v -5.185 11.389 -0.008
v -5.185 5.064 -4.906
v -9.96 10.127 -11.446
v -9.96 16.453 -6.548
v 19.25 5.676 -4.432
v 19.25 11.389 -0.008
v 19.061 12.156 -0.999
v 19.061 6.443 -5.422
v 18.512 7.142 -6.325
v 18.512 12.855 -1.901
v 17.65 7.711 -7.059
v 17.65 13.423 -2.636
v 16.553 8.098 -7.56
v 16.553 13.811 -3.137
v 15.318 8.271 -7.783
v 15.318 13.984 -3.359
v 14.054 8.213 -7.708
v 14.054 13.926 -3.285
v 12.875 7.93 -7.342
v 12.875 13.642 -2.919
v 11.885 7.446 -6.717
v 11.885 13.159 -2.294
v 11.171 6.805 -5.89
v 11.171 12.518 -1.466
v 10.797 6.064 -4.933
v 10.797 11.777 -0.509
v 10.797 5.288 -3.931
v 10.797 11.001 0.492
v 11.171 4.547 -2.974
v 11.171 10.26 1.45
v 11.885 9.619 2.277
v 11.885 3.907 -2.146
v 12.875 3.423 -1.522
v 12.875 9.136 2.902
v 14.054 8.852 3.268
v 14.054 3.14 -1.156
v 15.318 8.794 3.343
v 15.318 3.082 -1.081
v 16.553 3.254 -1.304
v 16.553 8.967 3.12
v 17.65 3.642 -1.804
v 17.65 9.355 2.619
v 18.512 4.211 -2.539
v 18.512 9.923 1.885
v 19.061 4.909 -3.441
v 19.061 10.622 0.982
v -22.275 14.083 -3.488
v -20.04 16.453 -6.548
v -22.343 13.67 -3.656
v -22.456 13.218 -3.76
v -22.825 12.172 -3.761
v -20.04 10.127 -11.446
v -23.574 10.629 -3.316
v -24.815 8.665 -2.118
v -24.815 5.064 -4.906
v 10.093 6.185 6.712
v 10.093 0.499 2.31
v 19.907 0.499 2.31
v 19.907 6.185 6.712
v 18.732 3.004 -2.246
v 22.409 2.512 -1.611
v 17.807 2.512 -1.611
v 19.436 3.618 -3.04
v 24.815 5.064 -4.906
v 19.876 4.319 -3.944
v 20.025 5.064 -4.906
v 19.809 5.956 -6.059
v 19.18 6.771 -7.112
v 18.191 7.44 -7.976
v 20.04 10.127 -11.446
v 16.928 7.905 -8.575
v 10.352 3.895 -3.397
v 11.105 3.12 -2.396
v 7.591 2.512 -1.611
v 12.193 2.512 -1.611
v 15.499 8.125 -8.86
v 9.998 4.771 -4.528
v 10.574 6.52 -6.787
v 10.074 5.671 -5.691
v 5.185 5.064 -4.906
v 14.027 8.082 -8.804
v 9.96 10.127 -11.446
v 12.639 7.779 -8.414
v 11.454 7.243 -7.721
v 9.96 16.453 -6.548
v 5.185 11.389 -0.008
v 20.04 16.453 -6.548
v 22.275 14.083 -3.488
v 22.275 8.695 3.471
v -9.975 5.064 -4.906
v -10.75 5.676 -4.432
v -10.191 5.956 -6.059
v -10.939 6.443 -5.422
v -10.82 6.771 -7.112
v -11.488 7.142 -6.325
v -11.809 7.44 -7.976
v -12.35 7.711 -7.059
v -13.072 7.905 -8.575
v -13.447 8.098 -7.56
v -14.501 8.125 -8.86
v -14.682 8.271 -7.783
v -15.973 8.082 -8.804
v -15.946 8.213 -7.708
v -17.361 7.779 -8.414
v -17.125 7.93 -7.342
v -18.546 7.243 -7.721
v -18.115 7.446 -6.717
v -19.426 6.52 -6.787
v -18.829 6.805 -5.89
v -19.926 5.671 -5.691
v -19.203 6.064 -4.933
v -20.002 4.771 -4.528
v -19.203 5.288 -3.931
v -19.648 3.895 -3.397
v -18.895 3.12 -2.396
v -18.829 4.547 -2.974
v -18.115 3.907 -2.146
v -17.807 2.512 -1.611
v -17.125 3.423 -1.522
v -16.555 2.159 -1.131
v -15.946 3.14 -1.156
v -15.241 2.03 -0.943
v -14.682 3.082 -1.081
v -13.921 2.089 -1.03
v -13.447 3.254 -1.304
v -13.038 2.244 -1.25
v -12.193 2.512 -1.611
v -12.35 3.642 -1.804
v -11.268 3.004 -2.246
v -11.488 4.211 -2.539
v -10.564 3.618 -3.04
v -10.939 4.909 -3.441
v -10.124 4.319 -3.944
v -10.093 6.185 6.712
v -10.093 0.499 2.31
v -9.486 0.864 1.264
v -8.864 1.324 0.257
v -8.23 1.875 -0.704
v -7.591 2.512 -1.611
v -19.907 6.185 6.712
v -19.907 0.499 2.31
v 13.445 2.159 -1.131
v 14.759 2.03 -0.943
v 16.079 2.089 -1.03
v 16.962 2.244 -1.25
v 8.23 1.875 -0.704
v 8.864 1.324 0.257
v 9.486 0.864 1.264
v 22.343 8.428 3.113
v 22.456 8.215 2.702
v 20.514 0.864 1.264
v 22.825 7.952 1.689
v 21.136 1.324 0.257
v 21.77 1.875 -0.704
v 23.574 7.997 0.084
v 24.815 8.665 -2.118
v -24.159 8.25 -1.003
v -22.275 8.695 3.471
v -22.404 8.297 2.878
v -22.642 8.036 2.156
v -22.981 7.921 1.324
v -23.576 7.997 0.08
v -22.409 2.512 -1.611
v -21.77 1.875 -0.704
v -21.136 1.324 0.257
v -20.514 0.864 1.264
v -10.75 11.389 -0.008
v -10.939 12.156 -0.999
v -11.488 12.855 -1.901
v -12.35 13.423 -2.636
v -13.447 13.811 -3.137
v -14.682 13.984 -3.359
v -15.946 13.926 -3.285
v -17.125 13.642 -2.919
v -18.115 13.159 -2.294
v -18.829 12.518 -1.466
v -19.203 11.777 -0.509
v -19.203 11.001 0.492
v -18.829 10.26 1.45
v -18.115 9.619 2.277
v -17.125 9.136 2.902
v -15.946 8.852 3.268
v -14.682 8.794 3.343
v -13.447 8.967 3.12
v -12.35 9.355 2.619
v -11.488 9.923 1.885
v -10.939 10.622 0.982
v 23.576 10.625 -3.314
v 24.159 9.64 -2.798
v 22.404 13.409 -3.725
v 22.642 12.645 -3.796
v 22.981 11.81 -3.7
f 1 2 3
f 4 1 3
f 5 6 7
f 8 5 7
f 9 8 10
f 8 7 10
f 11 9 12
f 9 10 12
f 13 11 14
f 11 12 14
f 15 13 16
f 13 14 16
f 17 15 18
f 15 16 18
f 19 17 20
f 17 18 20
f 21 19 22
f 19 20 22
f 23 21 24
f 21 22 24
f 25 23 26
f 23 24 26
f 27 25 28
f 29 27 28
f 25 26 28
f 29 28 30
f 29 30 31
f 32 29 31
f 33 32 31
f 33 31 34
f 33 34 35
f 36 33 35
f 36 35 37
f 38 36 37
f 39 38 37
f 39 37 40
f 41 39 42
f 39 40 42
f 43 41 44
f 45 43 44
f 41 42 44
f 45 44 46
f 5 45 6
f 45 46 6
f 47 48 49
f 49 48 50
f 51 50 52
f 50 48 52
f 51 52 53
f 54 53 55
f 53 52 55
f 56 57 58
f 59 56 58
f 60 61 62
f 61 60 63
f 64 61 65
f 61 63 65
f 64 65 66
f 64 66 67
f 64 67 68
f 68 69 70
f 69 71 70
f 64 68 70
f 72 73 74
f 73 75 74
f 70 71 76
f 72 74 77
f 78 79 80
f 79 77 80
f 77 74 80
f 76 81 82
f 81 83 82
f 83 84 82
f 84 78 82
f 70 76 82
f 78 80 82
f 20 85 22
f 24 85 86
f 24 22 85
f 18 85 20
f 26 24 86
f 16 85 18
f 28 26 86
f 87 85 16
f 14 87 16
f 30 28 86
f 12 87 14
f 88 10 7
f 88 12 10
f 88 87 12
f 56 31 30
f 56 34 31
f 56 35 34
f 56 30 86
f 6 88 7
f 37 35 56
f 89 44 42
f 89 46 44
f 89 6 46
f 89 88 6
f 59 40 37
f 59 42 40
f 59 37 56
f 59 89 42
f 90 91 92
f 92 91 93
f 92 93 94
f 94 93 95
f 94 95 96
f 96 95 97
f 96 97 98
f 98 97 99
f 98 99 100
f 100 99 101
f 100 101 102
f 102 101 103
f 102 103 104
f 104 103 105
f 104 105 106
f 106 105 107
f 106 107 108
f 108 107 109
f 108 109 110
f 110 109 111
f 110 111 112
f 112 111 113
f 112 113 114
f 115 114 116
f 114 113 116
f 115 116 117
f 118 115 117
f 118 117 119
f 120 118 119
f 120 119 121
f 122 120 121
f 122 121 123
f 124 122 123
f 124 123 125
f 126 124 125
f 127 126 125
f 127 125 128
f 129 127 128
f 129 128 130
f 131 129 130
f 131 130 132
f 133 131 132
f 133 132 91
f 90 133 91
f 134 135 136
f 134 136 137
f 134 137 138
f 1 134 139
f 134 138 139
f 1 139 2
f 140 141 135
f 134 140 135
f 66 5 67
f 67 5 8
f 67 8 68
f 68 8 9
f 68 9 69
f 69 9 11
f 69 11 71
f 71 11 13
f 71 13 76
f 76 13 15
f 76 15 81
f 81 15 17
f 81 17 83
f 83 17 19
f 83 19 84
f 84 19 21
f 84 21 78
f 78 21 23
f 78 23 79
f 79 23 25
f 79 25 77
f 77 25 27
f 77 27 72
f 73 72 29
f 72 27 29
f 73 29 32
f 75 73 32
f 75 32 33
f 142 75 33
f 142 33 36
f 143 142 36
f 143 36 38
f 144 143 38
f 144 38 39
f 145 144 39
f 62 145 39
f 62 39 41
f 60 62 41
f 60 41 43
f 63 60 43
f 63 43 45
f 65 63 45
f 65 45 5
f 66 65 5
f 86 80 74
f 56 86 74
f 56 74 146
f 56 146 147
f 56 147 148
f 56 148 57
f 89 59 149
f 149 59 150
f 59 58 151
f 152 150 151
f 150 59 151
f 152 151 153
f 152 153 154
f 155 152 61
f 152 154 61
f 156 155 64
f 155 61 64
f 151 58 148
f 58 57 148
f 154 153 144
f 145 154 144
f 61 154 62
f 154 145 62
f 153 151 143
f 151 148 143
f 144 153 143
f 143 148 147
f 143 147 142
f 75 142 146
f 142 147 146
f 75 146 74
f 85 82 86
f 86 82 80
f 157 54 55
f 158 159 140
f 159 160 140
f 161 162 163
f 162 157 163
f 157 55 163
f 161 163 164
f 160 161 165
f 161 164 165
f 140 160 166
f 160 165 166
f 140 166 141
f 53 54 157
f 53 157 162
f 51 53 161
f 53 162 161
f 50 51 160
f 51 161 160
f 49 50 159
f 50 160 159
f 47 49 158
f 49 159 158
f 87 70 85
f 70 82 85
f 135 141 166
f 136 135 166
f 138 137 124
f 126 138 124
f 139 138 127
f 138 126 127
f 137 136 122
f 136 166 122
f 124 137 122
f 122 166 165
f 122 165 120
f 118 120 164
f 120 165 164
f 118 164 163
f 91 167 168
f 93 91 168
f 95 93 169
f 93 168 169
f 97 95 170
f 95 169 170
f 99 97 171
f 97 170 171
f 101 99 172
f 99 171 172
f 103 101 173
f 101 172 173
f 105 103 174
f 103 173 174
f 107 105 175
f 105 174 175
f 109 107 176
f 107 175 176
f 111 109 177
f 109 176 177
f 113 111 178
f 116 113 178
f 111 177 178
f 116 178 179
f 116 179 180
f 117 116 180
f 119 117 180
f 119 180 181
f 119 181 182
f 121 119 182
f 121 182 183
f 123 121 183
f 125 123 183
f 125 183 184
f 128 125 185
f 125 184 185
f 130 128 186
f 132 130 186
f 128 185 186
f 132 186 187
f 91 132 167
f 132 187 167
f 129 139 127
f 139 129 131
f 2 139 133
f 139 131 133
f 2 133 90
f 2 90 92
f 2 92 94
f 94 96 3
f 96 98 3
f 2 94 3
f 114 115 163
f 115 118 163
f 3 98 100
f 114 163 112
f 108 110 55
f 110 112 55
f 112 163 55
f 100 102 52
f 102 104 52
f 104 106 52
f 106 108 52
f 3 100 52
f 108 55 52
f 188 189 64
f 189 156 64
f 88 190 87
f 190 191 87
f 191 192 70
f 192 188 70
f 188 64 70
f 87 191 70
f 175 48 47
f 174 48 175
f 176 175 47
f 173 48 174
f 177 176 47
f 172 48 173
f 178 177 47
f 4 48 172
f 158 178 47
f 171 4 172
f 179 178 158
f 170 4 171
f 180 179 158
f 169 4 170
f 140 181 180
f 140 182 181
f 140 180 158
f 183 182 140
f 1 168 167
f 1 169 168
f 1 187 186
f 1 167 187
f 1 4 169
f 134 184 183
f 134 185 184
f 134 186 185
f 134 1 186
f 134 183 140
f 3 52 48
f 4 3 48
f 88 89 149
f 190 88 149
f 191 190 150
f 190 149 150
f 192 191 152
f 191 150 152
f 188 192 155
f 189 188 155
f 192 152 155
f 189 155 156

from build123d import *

# Parameters (mm, degrees)
SKETCH1_W                    = 70
SKETCH1_H                    = 60
BOSS_EXTRUDE1_DEPTH          = 23.5
SKETCH2_R                    = 4.5
CUT_EXTRUDE1_DEPTH           = 80.701003758
CUT_EXTRUDE4_DEPTH           = 80.701003758
M10_TAPPED_HOLE1_D           = 8.5
M10_TAPPED_HOLE1_DEPTH       = 27.5
M10_TAPPED_HOLE1_CSINK_D     = 10.05
M10_TAPPED_HOLE1_CSINK_ANGLE = 90
M10_TAPPED_HOLE1_TIP         = 2.553657631
M10_TAPPED_HOLE2_D           = 8.5
M10_TAPPED_HOLE2_CSINK_D     = 10.05
M10_TAPPED_HOLE2_CSINK_ANGLE = 90
SKETCH5_W                    = 3
SKETCH5_H                    = 31.956569969
SKETCH5_W_2                  = 11.5
SKETCH5_H_2                  = 27.892636229
CUT_EXTRUDE2_DEPTH           = 52.742149163
CHAMFER1_SIZE                = 3
FILLET1_R                    = 12
SKETCH9_OUTSIDE_W            = 88.936
SKETCH9_OUTSIDE_H            = 66.094
CUT_EXTRUDE5_DEPTH           = 10
CUT_EXTRUDE6_DEPTH           = 80.701003758


with BuildPart() as part:
    # Sketch1 → Boss-Extrude1 (new body)
    with BuildSketch(Plane(origin=(0, 0, 0), x_dir=(1, 0, 0), z_dir=(0, 1, 0))):
        Rectangle(SKETCH1_W, SKETCH1_H)
    extrude(amount=BOSS_EXTRUDE1_DEPTH)

    # Sketch2 → Cut-Extrude1 (cut, through all)
    with BuildSketch(Plane(origin=(35, 0, 0), x_dir=(0, 0, -1), z_dir=(1, 0, 0))):
        with Locations((-18.25, 11.75)):
            Circle(SKETCH2_R)
    extrude(amount=-CUT_EXTRUDE1_DEPTH, mode=Mode.SUBTRACT)

    # Sketch6 → Cut-Extrude4 (cut, through all)
    with BuildSketch(Plane.ZY.offset(35)):
        Polygon((1.633407015, 0), (-11.44579872, 10.127003094), (5.022332022, 31.39588867), (-21.600150891, 35.884663023), (-49.264135094, 11.821162325), (1.633407015, -46.691886902), align=None)
    extrude(amount=-CUT_EXTRUDE4_DEPTH, mode=Mode.SUBTRACT)

    # M10 Tapped Hole1
    with Locations(Plane(origin=(0, 11.814481877, -13.625207767), x_dir=(-1, 0, 0), z_dir=(0, -0.7906895737438469, -0.612217280034445))):
        with Locations((-15, -11.027098629), (15, -11.027098629)):
            CounterSinkHole(M10_TAPPED_HOLE1_D / 2, M10_TAPPED_HOLE1_CSINK_D / 2, depth=M10_TAPPED_HOLE1_DEPTH, counter_sink_angle=M10_TAPPED_HOLE1_CSINK_ANGLE)
            with Locations((0, 0, -(M10_TAPPED_HOLE1_DEPTH + M10_TAPPED_HOLE1_TIP / 2))):  # 118° drill point
                Cone(0, M10_TAPPED_HOLE1_D / 2, M10_TAPPED_HOLE1_TIP, mode=Mode.SUBTRACT)

    # M10 Tapped Hole2 (through all)
    with Locations(Plane(origin=(0, 9.336313521, -12.058016), x_dir=(-1, 0, 0), z_dir=(0, 0.6122172800344449, -0.790689573743847))):
        with Locations((-26.5, 9.456540563), (0, 9.456540563), (26.5, 9.456540563)):
            CounterSinkHole(M10_TAPPED_HOLE2_D / 2, M10_TAPPED_HOLE2_CSINK_D / 2, counter_sink_angle=M10_TAPPED_HOLE2_CSINK_ANGLE)

    # Sketch5 → Cut-Extrude2 (cut, through all)
    with BuildSketch(Plane(origin=(0, 23.5, 0), x_dir=(1, 0, 0), z_dir=(0, 1, 0))):
        with Locations((-25.25926979, -22.978284985)):
            Rectangle(SKETCH5_W, SKETCH5_H)
        with Locations((0, -20.946318115)):
            Rectangle(SKETCH5_W_2, SKETCH5_H_2)
        with Locations((25.25926979, -22.978284985)):
            Rectangle(SKETCH5_W, SKETCH5_H)
    extrude(amount=-CUT_EXTRUDE2_DEPTH, mode=Mode.SUBTRACT)

    # Chamfer1
    chamfer1_edges = [part.edges().sort_by_distance(p)[0] for p in [
        (30.879634895, 0, 30),
        (30.879634895, 23.5, 30),
        (14.754634895, 0, 30),
        (14.754634895, 23.5, 30),
        (-30.879634895, 0, 30),
        (-30.879634895, 23.5, 30),
        (-14.754634895, 0, 30),
        (-14.754634895, 23.5, 30),
    ]]
    chamfer(chamfer1_edges, length=CHAMFER1_SIZE)

    # Fillet1
    # the kernel refuses this fillet: 12 mm, written as the material it takes off along each edge
    with BuildSketch(Plane(origin=(-45.256673558, 0, 1.633407015), x_dir=(0, 0, 1), z_dir=(1, 0, 0))) as fillet1_piece_1:
        with BuildLine():
            CenterArc((FILLET1_R * 0.341889118589, -FILLET1_R), FILLET1_R, 90, 37.75)
            Line((-FILLET1_R * 0.270328161445, -FILLET1_R * 0.209310426256), (0, 0))
            Line((0, 0), (FILLET1_R * 0.341889118589, 0))
        make_face()
    extrude(amount=90.513347115, mode=Mode.SUBTRACT)

    # Sketch9 outside → Cut-Extrude5 (cut)
    with BuildSketch(Plane(origin=(0, 10.739220374, -12.236488293), x_dir=(-1, 0, 0), z_dir=(0, 0.7906895737438466, 0.612217280034445))):
        with Locations((0, 16.392)):
            Rectangle(SKETCH9_OUTSIDE_W, SKETCH9_OUTSIDE_H)
        Polygon((19.907477288, 0.770758948), (24.814954576, 9.270758948), (19.907477288, 17.770758948), (10.092522712, 17.770758948), (5.185045424, 9.270758948), (10.092522712, 0.770758948), align=None, mode=Mode.SUBTRACT)
        Polygon((-10.092522712, 0.770758948), (-5.185045424, 9.270758948), (-10.092522712, 17.770758948), (-19.907477288, 17.770758948), (-24.814954576, 9.270758948), (-19.907477288, 0.770758948), align=None, mode=Mode.SUBTRACT)
    extrude(amount=CUT_EXTRUDE5_DEPTH, mode=Mode.SUBTRACT)

    # Sketch10 → Cut-Extrude6 (cut, through all)
    with BuildSketch(Plane(origin=(35, 0, 0), x_dir=(0, 0, -1), z_dir=(1, 0, 0))):
        Polygon((-12.900576366, 61.118553113), (16.010624605, 23.779219648), (-27.760891181, -10.112308997), (-56.672092153, 27.227024468), align=None)
    extrude(amount=-CUT_EXTRUDE6_DEPTH, mode=Mode.SUBTRACT)


with BuildPart() as cut_extrude6_piece_1:
    # of the separate pieces the step leaves, piece 1, a body of its own (cut_extrude6_pieces)
    add(part.part.solids().sort_by_distance((-9.960170329, 16.452519684, -6.548060479))[0])


with BuildPart() as cut_extrude6_piece_2:
    # of the separate pieces the step leaves, piece 2, a body of its own (cut_extrude6_pieces)
    add(part.part.solids().sort_by_distance((20.039829671, 16.452519684, -6.548060479))[0])


solid = Compound([cut_extrude6_piece_1.part, cut_extrude6_piece_2.part])
